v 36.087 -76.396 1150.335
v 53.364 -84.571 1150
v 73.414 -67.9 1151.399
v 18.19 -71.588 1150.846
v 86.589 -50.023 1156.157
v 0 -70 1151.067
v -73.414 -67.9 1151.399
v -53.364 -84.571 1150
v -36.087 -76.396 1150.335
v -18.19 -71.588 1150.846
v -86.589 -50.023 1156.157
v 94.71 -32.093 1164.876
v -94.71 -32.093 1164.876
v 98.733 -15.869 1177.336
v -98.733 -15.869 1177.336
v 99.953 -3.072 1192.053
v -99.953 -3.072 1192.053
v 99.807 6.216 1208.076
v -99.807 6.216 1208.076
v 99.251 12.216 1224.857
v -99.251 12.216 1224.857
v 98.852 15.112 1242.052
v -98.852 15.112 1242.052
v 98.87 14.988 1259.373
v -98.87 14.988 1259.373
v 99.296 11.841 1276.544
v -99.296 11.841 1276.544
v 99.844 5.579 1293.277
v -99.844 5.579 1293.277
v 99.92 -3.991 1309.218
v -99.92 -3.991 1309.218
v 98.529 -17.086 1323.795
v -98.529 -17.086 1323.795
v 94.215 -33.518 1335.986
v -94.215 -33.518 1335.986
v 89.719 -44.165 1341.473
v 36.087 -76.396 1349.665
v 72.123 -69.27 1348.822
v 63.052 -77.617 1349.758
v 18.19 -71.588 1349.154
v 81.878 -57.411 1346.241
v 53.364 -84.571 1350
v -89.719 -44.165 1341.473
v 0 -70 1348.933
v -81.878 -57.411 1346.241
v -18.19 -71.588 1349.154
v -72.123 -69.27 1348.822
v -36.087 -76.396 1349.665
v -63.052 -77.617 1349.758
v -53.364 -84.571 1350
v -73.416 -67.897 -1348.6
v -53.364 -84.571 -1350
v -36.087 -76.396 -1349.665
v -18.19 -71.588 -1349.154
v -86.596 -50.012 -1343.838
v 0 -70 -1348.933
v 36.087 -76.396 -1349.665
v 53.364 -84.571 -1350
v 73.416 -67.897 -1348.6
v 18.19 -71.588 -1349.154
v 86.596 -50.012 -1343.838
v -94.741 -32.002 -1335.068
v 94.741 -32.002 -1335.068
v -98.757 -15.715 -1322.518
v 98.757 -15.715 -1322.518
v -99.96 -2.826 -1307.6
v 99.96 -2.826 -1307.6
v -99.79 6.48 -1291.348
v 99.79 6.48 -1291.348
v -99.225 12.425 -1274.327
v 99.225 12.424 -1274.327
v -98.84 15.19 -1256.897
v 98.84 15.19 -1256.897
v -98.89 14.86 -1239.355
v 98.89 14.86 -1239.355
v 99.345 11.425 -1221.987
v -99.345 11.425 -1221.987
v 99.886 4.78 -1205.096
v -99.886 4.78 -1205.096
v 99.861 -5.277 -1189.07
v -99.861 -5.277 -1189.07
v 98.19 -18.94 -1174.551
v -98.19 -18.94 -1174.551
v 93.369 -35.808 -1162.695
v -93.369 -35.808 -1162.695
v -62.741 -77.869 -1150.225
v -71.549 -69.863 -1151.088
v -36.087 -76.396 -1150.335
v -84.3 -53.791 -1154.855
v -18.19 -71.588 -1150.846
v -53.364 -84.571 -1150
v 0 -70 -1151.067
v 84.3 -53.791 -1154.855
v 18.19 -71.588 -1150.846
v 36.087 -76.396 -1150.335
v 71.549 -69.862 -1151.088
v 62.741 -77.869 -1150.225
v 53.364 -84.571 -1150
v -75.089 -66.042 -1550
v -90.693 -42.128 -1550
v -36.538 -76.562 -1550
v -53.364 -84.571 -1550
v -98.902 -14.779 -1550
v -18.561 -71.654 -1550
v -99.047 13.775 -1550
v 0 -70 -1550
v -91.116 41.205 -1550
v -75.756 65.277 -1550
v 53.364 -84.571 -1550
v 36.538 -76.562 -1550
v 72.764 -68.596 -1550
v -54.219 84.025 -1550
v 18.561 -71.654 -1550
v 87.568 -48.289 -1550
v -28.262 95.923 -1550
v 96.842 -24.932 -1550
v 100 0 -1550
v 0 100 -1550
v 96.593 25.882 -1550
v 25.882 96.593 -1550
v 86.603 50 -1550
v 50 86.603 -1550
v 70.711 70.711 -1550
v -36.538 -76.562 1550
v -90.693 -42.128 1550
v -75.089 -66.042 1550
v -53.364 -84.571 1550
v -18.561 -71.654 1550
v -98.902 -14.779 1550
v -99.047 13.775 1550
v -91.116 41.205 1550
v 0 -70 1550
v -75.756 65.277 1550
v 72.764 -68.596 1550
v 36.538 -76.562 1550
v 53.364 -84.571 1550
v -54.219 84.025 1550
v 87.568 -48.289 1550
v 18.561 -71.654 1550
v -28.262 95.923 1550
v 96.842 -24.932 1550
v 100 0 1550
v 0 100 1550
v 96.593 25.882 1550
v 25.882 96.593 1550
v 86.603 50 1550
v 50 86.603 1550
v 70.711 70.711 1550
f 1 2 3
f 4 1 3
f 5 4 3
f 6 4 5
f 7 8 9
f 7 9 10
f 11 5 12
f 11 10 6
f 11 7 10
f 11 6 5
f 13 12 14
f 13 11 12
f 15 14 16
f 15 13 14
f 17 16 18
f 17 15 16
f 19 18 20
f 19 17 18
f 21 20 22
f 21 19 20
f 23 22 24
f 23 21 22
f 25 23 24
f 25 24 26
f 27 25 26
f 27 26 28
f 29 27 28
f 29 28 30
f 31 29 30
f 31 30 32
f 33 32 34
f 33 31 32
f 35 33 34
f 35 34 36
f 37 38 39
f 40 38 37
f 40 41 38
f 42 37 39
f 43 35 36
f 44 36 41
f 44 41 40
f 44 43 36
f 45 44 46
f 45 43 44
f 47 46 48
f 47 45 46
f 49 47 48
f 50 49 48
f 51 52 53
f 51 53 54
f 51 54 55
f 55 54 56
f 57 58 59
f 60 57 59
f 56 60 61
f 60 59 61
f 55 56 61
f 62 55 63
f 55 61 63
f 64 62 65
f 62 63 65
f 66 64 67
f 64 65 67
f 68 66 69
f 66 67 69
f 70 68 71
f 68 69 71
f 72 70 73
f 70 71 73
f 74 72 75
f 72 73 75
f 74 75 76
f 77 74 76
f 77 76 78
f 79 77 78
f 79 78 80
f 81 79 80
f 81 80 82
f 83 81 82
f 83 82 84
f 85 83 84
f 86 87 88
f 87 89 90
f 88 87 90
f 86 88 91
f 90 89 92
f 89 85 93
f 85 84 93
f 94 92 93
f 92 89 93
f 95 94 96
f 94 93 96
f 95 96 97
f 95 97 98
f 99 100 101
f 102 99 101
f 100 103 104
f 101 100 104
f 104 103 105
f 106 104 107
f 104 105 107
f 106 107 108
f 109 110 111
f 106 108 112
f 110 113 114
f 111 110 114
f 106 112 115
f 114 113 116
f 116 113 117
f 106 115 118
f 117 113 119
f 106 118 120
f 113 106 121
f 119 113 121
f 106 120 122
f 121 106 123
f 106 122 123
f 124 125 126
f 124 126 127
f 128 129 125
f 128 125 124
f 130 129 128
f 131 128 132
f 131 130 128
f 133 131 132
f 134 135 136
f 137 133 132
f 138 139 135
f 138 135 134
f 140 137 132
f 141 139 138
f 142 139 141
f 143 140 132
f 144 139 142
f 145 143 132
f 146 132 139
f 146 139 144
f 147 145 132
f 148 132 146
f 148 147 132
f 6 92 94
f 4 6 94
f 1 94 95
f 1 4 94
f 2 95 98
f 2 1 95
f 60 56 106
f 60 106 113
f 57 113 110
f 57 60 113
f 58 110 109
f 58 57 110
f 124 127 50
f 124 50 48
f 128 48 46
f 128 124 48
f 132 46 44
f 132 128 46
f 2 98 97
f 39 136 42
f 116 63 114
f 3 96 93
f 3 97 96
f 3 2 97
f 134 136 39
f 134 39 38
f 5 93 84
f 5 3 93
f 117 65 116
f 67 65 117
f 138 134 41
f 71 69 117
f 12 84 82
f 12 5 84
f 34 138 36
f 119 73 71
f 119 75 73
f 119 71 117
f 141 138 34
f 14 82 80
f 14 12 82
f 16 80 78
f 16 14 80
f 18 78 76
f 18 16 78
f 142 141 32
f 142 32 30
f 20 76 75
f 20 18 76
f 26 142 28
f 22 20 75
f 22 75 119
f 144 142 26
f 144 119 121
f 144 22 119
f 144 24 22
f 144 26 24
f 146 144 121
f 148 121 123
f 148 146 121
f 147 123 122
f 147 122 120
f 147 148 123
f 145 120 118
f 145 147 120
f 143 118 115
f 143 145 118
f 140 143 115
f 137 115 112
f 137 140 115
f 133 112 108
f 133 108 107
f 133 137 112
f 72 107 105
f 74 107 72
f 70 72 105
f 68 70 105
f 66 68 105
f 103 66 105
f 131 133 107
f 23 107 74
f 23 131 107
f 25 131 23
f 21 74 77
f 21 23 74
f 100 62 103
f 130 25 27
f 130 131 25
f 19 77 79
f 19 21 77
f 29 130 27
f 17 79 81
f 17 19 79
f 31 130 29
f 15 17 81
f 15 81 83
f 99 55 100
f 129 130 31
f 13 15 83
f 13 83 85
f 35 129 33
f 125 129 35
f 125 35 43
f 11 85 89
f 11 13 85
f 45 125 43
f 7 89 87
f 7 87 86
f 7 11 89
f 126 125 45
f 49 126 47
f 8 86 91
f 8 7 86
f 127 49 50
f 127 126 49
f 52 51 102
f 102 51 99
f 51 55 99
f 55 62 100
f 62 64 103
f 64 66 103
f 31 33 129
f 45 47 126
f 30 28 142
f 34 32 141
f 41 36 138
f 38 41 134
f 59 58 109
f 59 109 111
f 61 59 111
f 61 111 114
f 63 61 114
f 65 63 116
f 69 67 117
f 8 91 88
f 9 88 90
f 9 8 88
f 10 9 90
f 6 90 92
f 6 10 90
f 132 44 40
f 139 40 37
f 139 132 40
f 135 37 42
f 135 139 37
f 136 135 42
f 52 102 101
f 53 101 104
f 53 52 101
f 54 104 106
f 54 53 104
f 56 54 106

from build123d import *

# Parameters (mm, degrees)
EXTRUDE_1_DEPTH     = 1550
SKETCH_2_R          = 100
CUT_EXTRUDE_1_DEPTH = 3000


with BuildPart() as part:
    # Эскиз1 → Бобышка-Вытянуть1 (new, symmetric)
    with BuildSketch(Plane.XY):
        with BuildLine():
            ThreePointArc((100, 0), (70.710678119, 70.710678119), (0, 100))
            Line((0, 100), (0, -70))
            ThreePointArc((0, -70), (27.658633372, -73.708341903), (53.363596856, -84.571428571))
            ThreePointArc((53.363596856, -84.571428571), (87.568143995, -48.288923753), (100, 0))
        make_face()
        with BuildLine():
            Line((0, -70), (0, 100))
            ThreePointArc((0, 100), (-96.065453877, 27.774602993), (-53.363596856, -84.571428571))
            ThreePointArc((-53.363596856, -84.571428571), (-27.658633372, -73.708341903), (0, -70))
        make_face()
        with BuildLine():
            ThreePointArc((100, 0), (70.710678119, 70.710678119), (0, 100))
            Line((0, 100), (0, -70))
            ThreePointArc((0, -70), (27.658633372, -73.708341903), (53.363596856, -84.571428571))
            ThreePointArc((53.363596856, -84.571428571), (87.568143995, -48.288923753), (100, 0))
        make_face()
        with BuildLine():
            Line((0, -70), (0, 100))
            ThreePointArc((0, 100), (-96.065453877, 27.774602993), (-53.363596856, -84.571428571))
            ThreePointArc((-53.363596856, -84.571428571), (-27.658633372, -73.708341903), (0, -70))
        make_face()
    extrude(amount=EXTRUDE_1_DEPTH, both=True)

    # Эскиз2 → Вырез-Вытянуть1 (cut, symmetric)
    with BuildSketch(Plane(origin=(0, 0, 0), x_dir=(0, 0, -1), z_dir=(1, 0, 0))):
        with Locations((-1250, -84.571428571)):
            Circle(SKETCH_2_R)
        with Locations((1250, -84.571428571)):
            Circle(SKETCH_2_R)
    extrude(amount=CUT_EXTRUDE_1_DEPTH, both=True, mode=Mode.SUBTRACT)


solid = part.part
